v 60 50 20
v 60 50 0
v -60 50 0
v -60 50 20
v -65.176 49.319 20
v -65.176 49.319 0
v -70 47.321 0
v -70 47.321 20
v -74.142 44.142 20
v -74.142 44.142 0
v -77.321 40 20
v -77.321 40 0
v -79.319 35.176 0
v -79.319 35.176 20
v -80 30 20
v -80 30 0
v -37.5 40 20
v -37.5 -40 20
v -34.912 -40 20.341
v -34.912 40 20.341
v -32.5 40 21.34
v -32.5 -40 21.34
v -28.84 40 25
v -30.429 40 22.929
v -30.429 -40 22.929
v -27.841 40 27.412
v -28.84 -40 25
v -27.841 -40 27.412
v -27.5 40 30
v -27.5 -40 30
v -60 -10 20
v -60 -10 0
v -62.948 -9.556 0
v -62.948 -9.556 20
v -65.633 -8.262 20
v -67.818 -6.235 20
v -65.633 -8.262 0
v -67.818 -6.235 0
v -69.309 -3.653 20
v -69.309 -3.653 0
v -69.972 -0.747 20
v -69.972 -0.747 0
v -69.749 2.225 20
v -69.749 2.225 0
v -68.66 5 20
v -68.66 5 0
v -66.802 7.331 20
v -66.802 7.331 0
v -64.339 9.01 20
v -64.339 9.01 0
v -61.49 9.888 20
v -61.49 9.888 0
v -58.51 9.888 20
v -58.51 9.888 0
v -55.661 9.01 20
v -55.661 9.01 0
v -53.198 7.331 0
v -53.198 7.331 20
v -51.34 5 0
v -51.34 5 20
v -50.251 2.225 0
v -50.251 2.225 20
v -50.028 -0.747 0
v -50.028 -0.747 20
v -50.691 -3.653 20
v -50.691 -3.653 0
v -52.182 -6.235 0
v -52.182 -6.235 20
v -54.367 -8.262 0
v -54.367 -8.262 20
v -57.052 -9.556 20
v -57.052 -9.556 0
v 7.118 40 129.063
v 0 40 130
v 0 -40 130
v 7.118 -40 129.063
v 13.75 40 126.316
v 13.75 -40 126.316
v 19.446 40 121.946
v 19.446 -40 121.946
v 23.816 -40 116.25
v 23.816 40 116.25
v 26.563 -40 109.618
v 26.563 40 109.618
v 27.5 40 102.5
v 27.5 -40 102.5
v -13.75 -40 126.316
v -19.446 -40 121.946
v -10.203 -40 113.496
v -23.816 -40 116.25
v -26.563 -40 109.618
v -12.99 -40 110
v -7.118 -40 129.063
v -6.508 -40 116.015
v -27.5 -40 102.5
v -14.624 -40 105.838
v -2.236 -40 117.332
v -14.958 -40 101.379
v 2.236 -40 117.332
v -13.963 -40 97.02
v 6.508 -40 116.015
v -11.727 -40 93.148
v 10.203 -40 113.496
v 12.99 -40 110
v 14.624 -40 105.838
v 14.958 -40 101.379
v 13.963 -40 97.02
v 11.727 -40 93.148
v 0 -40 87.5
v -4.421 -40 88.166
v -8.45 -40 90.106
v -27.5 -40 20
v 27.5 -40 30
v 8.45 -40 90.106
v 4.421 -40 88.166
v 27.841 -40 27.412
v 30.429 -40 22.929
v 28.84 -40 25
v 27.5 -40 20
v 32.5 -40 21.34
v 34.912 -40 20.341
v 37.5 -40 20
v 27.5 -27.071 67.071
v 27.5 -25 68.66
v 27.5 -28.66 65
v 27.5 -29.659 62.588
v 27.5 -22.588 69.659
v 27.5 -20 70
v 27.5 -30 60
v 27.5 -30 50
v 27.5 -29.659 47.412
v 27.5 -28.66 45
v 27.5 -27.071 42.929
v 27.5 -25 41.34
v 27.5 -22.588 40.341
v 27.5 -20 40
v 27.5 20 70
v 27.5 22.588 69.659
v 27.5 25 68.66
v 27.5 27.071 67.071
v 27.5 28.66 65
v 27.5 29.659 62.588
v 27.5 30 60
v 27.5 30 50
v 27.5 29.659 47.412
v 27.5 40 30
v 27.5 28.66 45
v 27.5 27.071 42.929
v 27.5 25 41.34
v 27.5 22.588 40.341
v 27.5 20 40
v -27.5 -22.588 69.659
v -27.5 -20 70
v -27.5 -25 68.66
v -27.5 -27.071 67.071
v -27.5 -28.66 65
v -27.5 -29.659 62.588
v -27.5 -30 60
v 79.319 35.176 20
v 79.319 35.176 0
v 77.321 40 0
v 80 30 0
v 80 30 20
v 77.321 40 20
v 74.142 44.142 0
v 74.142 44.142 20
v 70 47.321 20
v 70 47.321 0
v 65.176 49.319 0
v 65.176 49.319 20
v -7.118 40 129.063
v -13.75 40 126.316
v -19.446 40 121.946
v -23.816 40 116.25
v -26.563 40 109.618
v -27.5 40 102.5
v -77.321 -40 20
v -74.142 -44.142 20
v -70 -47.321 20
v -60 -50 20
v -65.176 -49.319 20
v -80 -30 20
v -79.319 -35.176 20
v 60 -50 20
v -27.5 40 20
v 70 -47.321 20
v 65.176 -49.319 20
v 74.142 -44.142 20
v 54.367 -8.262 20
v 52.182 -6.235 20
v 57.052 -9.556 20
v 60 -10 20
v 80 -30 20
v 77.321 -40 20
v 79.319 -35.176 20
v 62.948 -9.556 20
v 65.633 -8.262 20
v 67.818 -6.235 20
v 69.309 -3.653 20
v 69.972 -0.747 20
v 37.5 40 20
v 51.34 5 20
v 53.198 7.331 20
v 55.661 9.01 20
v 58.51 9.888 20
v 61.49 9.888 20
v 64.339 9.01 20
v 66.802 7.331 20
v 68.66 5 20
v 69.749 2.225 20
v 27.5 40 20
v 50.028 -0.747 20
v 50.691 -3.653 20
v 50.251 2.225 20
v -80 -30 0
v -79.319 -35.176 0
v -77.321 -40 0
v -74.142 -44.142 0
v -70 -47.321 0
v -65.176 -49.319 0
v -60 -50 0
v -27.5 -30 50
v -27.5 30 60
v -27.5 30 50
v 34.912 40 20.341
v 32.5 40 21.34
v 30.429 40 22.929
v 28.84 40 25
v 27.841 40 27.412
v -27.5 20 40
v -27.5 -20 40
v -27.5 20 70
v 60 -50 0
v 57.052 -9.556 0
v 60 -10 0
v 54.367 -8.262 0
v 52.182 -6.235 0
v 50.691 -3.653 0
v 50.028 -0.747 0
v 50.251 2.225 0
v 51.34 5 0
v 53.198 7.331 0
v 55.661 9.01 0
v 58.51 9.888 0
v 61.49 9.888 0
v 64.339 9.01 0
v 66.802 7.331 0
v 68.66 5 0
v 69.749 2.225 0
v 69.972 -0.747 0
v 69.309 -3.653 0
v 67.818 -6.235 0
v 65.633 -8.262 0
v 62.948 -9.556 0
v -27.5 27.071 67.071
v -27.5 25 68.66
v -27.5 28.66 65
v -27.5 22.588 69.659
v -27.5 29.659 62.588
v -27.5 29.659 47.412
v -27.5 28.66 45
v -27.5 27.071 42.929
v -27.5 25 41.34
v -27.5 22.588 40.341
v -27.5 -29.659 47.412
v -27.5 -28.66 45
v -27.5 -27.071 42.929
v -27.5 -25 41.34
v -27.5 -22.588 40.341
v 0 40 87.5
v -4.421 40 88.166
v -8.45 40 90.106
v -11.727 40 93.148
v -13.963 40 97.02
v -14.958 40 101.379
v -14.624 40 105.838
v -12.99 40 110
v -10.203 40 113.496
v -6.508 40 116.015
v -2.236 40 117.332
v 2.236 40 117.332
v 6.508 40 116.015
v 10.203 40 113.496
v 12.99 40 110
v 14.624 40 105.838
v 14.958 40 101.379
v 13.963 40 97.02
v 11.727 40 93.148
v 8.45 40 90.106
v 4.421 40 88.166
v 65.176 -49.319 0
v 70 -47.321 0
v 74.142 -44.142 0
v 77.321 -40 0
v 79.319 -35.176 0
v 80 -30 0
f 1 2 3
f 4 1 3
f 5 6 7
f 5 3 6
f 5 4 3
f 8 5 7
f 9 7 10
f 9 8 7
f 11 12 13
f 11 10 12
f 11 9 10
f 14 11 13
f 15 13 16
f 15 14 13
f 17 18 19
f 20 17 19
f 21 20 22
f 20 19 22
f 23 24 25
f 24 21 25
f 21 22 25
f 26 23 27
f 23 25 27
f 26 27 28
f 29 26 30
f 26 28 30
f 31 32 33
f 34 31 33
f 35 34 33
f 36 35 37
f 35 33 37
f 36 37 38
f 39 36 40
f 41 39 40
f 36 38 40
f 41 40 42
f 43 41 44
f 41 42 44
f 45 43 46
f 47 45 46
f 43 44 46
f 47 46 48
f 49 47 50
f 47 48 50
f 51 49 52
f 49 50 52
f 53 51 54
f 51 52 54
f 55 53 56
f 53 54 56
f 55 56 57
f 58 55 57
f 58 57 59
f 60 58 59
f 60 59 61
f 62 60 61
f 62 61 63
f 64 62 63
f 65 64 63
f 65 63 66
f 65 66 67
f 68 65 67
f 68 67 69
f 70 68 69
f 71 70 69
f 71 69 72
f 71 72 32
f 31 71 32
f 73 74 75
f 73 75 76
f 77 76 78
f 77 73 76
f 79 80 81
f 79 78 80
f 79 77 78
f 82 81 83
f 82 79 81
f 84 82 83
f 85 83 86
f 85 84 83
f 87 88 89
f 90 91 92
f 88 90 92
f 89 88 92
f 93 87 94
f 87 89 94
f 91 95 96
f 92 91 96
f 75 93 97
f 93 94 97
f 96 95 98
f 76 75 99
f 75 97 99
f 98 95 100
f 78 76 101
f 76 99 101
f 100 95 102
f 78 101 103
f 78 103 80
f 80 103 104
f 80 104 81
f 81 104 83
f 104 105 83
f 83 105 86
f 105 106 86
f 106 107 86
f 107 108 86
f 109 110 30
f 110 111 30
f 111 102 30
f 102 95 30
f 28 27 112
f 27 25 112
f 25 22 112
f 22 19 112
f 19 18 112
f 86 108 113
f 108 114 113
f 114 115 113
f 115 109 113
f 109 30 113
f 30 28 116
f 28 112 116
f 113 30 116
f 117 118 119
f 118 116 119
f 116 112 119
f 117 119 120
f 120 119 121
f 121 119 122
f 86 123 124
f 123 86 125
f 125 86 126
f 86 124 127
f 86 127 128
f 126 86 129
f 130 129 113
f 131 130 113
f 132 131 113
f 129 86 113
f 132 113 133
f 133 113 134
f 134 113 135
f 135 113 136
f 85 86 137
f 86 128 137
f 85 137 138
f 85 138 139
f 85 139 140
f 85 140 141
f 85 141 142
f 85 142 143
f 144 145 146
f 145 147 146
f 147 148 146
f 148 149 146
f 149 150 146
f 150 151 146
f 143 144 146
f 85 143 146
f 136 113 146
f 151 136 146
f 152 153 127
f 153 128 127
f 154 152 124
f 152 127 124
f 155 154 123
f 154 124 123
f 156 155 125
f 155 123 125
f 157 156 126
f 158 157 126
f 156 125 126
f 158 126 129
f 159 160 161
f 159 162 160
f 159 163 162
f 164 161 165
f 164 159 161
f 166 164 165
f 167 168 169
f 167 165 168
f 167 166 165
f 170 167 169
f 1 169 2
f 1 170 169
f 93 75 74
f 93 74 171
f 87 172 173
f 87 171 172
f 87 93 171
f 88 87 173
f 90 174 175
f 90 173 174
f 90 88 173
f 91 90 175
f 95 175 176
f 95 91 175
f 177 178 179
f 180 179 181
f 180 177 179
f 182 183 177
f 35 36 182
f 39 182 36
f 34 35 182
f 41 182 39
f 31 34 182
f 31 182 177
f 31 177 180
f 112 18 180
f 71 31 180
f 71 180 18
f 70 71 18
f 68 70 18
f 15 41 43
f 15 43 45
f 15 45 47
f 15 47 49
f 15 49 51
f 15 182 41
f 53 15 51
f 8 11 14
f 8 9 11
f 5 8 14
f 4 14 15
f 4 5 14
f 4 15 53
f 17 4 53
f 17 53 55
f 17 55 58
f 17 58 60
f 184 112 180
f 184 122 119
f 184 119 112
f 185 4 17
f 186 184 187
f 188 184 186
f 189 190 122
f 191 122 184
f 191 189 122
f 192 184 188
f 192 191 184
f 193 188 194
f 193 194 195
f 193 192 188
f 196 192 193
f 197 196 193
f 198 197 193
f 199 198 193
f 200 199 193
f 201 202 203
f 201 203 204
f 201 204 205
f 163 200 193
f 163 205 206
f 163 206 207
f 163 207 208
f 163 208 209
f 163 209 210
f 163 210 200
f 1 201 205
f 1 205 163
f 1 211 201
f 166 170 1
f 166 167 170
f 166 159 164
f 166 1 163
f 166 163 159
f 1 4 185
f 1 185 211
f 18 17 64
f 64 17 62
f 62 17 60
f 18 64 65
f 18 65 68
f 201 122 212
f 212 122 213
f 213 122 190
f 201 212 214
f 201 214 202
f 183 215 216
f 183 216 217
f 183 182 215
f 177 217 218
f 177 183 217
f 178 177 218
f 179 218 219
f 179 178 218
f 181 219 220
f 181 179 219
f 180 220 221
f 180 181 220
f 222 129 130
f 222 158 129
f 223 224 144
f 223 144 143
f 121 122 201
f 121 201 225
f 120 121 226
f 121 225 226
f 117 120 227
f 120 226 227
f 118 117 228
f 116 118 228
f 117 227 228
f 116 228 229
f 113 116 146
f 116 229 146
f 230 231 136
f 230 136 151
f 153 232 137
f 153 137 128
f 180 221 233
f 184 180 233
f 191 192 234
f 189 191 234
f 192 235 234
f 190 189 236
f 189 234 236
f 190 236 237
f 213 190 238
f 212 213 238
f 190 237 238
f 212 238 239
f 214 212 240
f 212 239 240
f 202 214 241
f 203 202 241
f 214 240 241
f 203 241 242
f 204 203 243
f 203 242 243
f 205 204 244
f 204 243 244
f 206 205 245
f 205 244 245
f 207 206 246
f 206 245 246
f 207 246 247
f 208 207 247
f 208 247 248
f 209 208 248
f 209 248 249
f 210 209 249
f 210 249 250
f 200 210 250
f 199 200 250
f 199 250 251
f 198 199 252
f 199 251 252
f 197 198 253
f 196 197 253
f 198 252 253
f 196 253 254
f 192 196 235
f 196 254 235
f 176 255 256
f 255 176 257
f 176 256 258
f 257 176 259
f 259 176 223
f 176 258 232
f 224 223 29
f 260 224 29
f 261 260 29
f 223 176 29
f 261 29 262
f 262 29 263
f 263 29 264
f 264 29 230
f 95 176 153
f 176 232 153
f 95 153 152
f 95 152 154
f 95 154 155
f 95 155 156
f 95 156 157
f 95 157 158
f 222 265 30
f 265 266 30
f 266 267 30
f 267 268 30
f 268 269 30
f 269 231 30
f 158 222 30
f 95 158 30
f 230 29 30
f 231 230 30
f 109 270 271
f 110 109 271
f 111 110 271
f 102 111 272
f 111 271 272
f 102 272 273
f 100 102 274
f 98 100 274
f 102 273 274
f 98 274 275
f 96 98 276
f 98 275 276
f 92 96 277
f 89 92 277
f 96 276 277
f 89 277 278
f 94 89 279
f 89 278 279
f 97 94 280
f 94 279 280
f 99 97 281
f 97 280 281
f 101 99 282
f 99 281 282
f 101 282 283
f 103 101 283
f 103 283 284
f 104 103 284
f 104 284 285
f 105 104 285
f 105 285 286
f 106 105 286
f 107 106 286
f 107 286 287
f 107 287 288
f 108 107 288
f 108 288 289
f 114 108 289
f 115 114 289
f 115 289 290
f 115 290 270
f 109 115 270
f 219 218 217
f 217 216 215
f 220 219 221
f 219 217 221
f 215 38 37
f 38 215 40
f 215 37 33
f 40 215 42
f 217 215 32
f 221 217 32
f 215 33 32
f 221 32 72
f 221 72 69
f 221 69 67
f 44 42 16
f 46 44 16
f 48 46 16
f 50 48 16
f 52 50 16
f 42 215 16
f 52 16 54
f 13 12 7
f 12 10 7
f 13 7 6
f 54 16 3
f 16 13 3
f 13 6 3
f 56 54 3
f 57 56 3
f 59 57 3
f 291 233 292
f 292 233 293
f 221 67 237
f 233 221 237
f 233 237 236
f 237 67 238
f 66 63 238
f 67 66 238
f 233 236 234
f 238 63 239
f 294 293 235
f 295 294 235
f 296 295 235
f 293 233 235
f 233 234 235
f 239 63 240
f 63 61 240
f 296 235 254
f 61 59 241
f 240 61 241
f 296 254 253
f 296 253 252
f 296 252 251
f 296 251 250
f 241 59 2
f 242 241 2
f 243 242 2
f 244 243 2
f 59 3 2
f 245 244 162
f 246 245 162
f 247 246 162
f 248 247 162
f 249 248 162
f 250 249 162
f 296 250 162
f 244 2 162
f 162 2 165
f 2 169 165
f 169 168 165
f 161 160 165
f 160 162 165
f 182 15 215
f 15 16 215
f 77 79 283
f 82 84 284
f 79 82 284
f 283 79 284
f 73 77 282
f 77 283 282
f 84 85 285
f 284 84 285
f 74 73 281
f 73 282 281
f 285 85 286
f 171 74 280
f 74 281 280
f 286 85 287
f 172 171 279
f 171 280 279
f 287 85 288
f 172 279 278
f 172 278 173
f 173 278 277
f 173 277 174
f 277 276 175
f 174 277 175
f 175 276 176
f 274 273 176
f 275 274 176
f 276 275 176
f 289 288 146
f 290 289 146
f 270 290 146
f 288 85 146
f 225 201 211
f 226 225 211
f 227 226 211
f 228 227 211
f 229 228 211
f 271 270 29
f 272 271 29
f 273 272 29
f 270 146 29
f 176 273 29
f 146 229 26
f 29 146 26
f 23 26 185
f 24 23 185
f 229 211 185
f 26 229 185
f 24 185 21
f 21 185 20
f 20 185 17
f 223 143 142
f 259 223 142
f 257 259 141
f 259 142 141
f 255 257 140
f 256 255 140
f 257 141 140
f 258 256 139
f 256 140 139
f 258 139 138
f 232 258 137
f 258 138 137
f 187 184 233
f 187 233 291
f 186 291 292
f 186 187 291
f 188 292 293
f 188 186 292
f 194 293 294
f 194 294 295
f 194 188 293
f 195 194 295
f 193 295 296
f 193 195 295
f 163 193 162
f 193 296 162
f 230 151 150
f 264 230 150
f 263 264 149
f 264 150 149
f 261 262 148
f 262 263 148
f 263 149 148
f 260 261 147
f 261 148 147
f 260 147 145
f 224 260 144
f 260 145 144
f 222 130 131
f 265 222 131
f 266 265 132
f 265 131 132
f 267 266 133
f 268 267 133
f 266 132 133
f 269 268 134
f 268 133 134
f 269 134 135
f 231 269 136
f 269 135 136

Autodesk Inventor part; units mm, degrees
ref_plane "YZ Plane" through (0, 0, 0) normal (1, 0, 0) x (0, 1, 0)
ref_plane "XZ Plane" through (0, 0, 0) normal (0, 1, 0) x (-1, 0, 0)
ref_plane "XY Plane" through (0, 0, 0) normal (0, 0, 1) x (1, 0, 0)
sketch "Esboço1" plane through (0, 0, 0) normal (0, 0, 1) x (1, 0, 0)
  line L0 (-80, -50) -> (80, -50)
  line L1 (80, -50) -> (80, 50)
  line L2 (80, 50) -> (-80, 50)
  line L3 (-80, 50) -> (-80, -50)
  line L4 (-80, -50) -> (80, 50) construction
  line L5 (80, -50) -> (-80, 50) construction
  point P0 (0, 0)
  dimension "d0" = 100
  dimension "d1" = 160
extrude "Extrusão1" add sketch "Esboço1" along normal blind 20
sketch "Esboço2" plane through (0, 0, 20) normal (0, 0, 1) x (1, 0, 0)
  line L0 (-27.5, -40) -> (27.5, -40)
  line L1 (27.5, -40) -> (27.5, 40)
  line L2 (27.5, 40) -> (-27.5, 40)
  line L3 (-27.5, 40) -> (-27.5, -40)
  line L4 (-27.5, -40) -> (27.5, 40) construction
  line L5 (27.5, -40) -> (-27.5, 40) construction
  point P0 (0, 0)
  dimension "d4" = 55
  dimension "d5" = 80
extrude "Extrusão2" add sketch "Esboço2" along normal blind 110
fillet "Arredondamento1" radius 27.5 2 edges at (-27.5, 0, 130) (27.5, 0, 130)
sketch "Esboço3" plane through (-27.5, -40, 20) normal (0, -1, 0) x (1, 0, 0)
  arc A0 (55, 82.5) -> (0, 82.5) centre (27.5, 82.5) ccw projected
  point P0 (27.5, -20)
hole "Furo1" at (0, -40, 102.5) direction (0, 1, 0) diameter 30 end through all
sketch "Esboço4" plane through (-27.5, -40, 20) normal (-1, 0, 0) x (0, 0, 1)
  line L0 (20, 70) -> (50, 70)
  line L1 (50, 70) -> (50, 10)
  line L2 (50, 10) -> (20, 10)
  line L3 (20, 10) -> (20, 70)
  line L4 (20, 70) -> (50, 10) construction
  line L5 (50, 70) -> (20, 10) construction
  line L6 (-20, -10) -> (-20, 90) projected
  line L7 (82.5, 80) -> (82.5, 0) projected
  point P0 (-20, 40)
  point P1 (35, 40)
  point P2 (35, 40)
  point P3 (82.5, 40)
  dimension "d18" = 60
  dimension "d19" = 55
  dimension "d20" = 30
extrude "Extrusão3" cut sketch "Esboço4" against normal through all
sketch "Esboço5" plane through (0, 0, 20) normal (0, 0, 1) x (1, 0, 0)
  line L0 (-80, 50) -> (-80, -50) projected
  line L1 (-80, -50) -> (80, -50) projected
  line L2 (80, -50) -> (80, 50) projected
  point P0 (0, 0)
  point P1 (-60, 0)
  point P2 (60, 0)
  dimension "d23" = 20
  dimension "d24" = 50
  dimension "d25" = 20
  dimension "d26" = 50
hole "Furo2" at (-60, 0, 20) at (60, 0, 20) direction (0, 0, -1) diameter 20 end through all
fillet "Arredondamento2" radius 10 4 edges at (0, 30, 40) (0, -30, 70) (0, -30, 40) (0, 30, 70)
fillet "Arredondamento3" radius 10 2 edges at (-27.5, 0, 20) (27.5, 0, 20)
fillet "Arredondamento4" radius 20 4 edges at (80, -50, 10) (80, 50, 10) (-80, -50, 10) (-80, 50, 10)
equation "\"d8\" = 0.5 * d4"
equation "\"d24\" = 0.5 * d0"
equation "\"d26\" = 0.5 * d0"
